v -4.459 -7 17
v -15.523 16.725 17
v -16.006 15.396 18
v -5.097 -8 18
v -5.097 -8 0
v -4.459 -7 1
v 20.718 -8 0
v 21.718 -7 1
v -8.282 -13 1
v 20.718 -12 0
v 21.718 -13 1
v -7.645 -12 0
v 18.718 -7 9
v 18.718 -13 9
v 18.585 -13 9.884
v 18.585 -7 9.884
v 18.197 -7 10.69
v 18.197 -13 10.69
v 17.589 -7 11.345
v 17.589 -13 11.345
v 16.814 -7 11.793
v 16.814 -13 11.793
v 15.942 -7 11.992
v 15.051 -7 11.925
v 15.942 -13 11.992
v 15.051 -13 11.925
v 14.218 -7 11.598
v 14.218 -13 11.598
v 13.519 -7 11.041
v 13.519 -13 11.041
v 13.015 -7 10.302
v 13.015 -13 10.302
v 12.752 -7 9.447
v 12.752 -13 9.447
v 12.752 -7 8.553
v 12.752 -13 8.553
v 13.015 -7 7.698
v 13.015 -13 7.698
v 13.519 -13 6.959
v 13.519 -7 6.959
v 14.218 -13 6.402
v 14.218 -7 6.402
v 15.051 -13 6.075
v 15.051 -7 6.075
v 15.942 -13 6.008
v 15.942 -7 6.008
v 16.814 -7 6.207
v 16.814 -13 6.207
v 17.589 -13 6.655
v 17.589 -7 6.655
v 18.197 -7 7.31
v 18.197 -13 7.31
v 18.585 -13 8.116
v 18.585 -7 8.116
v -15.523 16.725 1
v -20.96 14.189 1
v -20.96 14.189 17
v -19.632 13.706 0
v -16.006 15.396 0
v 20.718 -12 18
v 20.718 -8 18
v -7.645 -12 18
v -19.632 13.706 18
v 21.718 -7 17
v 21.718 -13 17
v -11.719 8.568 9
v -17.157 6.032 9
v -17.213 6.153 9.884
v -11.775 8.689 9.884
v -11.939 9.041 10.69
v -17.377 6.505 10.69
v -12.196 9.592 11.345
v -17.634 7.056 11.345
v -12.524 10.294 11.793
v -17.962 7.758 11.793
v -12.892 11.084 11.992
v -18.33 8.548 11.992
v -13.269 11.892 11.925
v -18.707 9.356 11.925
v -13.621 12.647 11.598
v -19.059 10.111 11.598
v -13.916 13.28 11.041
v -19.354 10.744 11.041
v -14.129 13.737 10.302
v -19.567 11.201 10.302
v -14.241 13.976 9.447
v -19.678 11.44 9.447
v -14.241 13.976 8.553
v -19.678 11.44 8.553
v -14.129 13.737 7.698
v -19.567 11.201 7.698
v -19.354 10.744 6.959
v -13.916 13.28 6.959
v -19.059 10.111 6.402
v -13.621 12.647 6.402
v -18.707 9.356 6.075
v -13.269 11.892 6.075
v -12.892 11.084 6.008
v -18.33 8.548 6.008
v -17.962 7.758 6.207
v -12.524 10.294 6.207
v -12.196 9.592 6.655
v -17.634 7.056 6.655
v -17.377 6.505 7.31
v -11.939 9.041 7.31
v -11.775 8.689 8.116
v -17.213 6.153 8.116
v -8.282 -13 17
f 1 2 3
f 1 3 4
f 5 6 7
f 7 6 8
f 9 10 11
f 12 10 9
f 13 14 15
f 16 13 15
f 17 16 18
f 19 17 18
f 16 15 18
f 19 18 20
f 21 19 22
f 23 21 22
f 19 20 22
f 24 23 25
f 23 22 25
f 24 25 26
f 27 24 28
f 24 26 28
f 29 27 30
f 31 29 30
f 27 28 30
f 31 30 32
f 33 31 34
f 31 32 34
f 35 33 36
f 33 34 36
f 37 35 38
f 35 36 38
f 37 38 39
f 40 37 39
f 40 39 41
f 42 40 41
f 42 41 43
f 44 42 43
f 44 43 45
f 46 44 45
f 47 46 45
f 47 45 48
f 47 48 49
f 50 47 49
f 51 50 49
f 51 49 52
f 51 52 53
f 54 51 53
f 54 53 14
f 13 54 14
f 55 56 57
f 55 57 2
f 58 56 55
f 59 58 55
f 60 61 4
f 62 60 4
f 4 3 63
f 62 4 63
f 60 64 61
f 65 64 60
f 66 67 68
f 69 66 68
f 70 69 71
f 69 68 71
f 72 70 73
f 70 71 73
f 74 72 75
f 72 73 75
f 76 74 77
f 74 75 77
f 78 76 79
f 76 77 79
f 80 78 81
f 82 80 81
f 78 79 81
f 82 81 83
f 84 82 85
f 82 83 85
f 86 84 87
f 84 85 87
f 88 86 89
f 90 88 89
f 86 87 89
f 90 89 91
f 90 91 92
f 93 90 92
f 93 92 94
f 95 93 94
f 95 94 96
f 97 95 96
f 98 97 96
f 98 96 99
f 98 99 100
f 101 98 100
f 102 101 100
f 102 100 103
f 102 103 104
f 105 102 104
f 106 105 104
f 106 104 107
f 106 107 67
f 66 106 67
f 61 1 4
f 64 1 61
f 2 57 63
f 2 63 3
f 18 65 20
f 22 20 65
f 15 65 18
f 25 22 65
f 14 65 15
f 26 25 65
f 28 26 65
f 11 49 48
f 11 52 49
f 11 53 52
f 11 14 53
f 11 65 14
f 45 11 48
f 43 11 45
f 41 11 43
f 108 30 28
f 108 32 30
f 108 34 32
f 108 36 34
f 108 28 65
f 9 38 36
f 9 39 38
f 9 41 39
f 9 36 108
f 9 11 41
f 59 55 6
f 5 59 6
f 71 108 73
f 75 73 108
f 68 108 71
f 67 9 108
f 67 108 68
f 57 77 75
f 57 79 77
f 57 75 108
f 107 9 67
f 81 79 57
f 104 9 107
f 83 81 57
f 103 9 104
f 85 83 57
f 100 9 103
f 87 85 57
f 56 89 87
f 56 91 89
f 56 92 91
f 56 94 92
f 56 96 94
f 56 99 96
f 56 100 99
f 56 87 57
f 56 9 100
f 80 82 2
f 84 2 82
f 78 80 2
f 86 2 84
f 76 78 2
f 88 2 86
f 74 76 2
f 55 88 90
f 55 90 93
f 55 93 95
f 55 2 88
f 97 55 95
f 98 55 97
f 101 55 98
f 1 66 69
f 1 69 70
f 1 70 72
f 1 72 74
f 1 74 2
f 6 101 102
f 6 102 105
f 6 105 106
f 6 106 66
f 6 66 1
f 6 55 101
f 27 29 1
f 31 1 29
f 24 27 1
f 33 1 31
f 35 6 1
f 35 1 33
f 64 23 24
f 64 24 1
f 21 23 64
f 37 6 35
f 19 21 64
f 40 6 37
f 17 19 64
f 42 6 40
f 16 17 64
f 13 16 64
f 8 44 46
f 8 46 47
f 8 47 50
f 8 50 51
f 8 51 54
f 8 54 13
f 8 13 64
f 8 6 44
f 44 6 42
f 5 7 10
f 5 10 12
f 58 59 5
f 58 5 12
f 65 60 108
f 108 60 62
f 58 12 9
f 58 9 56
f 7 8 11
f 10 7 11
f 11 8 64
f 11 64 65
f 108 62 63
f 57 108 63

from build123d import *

# Parameters (mm, degrees)
PAD_DEPTH       = 18
SKETCH001_R     = 3
POCKET_DEPTH    = 39.7525374288
SKETCH002_R     = 3
POCKET001_DEPTH = 29.7259431815
CHAMFER_SIZE    = 1


with BuildPart() as part:
    # Sketch → Pad (new body)
    with BuildSketch(Plane.XY):
        Polygon((-8.2819133905, -13), (-20.9604612427, 14.1892336111), (-15.5226145205, 16.7249431815), (-4.4594918257, -7), (21.7180866095, -7), (21.7180866095, -13), align=None)
    extrude(amount=PAD_DEPTH)

    # Sketch001 (on Face1 of Pad) → Pocket (cut, through all)
    with BuildSketch(Plane(origin=(-11.7820012315, -5.4940374026, 0), x_dir=(0.4226182617, -0.906307787, 0), z_dir=(-0.906307787, -0.4226182617, 0))):
        with Locations((-15.7180866095, 9)):
            Circle(SKETCH001_R)
    extrude(amount=-POCKET_DEPTH, mode=Mode.SUBTRACT)

    # Sketch002 (on Face2 of Pocket) → Pocket001 (cut, through all)
    with BuildSketch(Plane.XZ.offset(13)):
        with Locations((15.7180866095, 9)):
            Circle(SKETCH002_R)
    extrude(amount=-POCKET001_DEPTH, mode=Mode.SUBTRACT)

    # Chamfer
    chamfer_edges = [part.edges().sort_by_distance(p)[0] for p in [
        (-14.621187, 0.594617, 18),
        (-18.241538, 15.457088, 18),
        (-9.991053, 4.862472, 18),
        (8.629297, -7, 18),
        (21.718087, -10, 18),
        (6.718087, -13, 18),
        (-14.621187, 0.594617, 0),
        (-18.241538, 15.457088, 0),
        (-9.991053, 4.862472, 0),
        (8.629297, -7, 0),
        (21.718087, -10, 0),
        (6.718087, -13, 0),
    ]]
    chamfer(chamfer_edges, length=CHAMFER_SIZE)


solid = part.part
